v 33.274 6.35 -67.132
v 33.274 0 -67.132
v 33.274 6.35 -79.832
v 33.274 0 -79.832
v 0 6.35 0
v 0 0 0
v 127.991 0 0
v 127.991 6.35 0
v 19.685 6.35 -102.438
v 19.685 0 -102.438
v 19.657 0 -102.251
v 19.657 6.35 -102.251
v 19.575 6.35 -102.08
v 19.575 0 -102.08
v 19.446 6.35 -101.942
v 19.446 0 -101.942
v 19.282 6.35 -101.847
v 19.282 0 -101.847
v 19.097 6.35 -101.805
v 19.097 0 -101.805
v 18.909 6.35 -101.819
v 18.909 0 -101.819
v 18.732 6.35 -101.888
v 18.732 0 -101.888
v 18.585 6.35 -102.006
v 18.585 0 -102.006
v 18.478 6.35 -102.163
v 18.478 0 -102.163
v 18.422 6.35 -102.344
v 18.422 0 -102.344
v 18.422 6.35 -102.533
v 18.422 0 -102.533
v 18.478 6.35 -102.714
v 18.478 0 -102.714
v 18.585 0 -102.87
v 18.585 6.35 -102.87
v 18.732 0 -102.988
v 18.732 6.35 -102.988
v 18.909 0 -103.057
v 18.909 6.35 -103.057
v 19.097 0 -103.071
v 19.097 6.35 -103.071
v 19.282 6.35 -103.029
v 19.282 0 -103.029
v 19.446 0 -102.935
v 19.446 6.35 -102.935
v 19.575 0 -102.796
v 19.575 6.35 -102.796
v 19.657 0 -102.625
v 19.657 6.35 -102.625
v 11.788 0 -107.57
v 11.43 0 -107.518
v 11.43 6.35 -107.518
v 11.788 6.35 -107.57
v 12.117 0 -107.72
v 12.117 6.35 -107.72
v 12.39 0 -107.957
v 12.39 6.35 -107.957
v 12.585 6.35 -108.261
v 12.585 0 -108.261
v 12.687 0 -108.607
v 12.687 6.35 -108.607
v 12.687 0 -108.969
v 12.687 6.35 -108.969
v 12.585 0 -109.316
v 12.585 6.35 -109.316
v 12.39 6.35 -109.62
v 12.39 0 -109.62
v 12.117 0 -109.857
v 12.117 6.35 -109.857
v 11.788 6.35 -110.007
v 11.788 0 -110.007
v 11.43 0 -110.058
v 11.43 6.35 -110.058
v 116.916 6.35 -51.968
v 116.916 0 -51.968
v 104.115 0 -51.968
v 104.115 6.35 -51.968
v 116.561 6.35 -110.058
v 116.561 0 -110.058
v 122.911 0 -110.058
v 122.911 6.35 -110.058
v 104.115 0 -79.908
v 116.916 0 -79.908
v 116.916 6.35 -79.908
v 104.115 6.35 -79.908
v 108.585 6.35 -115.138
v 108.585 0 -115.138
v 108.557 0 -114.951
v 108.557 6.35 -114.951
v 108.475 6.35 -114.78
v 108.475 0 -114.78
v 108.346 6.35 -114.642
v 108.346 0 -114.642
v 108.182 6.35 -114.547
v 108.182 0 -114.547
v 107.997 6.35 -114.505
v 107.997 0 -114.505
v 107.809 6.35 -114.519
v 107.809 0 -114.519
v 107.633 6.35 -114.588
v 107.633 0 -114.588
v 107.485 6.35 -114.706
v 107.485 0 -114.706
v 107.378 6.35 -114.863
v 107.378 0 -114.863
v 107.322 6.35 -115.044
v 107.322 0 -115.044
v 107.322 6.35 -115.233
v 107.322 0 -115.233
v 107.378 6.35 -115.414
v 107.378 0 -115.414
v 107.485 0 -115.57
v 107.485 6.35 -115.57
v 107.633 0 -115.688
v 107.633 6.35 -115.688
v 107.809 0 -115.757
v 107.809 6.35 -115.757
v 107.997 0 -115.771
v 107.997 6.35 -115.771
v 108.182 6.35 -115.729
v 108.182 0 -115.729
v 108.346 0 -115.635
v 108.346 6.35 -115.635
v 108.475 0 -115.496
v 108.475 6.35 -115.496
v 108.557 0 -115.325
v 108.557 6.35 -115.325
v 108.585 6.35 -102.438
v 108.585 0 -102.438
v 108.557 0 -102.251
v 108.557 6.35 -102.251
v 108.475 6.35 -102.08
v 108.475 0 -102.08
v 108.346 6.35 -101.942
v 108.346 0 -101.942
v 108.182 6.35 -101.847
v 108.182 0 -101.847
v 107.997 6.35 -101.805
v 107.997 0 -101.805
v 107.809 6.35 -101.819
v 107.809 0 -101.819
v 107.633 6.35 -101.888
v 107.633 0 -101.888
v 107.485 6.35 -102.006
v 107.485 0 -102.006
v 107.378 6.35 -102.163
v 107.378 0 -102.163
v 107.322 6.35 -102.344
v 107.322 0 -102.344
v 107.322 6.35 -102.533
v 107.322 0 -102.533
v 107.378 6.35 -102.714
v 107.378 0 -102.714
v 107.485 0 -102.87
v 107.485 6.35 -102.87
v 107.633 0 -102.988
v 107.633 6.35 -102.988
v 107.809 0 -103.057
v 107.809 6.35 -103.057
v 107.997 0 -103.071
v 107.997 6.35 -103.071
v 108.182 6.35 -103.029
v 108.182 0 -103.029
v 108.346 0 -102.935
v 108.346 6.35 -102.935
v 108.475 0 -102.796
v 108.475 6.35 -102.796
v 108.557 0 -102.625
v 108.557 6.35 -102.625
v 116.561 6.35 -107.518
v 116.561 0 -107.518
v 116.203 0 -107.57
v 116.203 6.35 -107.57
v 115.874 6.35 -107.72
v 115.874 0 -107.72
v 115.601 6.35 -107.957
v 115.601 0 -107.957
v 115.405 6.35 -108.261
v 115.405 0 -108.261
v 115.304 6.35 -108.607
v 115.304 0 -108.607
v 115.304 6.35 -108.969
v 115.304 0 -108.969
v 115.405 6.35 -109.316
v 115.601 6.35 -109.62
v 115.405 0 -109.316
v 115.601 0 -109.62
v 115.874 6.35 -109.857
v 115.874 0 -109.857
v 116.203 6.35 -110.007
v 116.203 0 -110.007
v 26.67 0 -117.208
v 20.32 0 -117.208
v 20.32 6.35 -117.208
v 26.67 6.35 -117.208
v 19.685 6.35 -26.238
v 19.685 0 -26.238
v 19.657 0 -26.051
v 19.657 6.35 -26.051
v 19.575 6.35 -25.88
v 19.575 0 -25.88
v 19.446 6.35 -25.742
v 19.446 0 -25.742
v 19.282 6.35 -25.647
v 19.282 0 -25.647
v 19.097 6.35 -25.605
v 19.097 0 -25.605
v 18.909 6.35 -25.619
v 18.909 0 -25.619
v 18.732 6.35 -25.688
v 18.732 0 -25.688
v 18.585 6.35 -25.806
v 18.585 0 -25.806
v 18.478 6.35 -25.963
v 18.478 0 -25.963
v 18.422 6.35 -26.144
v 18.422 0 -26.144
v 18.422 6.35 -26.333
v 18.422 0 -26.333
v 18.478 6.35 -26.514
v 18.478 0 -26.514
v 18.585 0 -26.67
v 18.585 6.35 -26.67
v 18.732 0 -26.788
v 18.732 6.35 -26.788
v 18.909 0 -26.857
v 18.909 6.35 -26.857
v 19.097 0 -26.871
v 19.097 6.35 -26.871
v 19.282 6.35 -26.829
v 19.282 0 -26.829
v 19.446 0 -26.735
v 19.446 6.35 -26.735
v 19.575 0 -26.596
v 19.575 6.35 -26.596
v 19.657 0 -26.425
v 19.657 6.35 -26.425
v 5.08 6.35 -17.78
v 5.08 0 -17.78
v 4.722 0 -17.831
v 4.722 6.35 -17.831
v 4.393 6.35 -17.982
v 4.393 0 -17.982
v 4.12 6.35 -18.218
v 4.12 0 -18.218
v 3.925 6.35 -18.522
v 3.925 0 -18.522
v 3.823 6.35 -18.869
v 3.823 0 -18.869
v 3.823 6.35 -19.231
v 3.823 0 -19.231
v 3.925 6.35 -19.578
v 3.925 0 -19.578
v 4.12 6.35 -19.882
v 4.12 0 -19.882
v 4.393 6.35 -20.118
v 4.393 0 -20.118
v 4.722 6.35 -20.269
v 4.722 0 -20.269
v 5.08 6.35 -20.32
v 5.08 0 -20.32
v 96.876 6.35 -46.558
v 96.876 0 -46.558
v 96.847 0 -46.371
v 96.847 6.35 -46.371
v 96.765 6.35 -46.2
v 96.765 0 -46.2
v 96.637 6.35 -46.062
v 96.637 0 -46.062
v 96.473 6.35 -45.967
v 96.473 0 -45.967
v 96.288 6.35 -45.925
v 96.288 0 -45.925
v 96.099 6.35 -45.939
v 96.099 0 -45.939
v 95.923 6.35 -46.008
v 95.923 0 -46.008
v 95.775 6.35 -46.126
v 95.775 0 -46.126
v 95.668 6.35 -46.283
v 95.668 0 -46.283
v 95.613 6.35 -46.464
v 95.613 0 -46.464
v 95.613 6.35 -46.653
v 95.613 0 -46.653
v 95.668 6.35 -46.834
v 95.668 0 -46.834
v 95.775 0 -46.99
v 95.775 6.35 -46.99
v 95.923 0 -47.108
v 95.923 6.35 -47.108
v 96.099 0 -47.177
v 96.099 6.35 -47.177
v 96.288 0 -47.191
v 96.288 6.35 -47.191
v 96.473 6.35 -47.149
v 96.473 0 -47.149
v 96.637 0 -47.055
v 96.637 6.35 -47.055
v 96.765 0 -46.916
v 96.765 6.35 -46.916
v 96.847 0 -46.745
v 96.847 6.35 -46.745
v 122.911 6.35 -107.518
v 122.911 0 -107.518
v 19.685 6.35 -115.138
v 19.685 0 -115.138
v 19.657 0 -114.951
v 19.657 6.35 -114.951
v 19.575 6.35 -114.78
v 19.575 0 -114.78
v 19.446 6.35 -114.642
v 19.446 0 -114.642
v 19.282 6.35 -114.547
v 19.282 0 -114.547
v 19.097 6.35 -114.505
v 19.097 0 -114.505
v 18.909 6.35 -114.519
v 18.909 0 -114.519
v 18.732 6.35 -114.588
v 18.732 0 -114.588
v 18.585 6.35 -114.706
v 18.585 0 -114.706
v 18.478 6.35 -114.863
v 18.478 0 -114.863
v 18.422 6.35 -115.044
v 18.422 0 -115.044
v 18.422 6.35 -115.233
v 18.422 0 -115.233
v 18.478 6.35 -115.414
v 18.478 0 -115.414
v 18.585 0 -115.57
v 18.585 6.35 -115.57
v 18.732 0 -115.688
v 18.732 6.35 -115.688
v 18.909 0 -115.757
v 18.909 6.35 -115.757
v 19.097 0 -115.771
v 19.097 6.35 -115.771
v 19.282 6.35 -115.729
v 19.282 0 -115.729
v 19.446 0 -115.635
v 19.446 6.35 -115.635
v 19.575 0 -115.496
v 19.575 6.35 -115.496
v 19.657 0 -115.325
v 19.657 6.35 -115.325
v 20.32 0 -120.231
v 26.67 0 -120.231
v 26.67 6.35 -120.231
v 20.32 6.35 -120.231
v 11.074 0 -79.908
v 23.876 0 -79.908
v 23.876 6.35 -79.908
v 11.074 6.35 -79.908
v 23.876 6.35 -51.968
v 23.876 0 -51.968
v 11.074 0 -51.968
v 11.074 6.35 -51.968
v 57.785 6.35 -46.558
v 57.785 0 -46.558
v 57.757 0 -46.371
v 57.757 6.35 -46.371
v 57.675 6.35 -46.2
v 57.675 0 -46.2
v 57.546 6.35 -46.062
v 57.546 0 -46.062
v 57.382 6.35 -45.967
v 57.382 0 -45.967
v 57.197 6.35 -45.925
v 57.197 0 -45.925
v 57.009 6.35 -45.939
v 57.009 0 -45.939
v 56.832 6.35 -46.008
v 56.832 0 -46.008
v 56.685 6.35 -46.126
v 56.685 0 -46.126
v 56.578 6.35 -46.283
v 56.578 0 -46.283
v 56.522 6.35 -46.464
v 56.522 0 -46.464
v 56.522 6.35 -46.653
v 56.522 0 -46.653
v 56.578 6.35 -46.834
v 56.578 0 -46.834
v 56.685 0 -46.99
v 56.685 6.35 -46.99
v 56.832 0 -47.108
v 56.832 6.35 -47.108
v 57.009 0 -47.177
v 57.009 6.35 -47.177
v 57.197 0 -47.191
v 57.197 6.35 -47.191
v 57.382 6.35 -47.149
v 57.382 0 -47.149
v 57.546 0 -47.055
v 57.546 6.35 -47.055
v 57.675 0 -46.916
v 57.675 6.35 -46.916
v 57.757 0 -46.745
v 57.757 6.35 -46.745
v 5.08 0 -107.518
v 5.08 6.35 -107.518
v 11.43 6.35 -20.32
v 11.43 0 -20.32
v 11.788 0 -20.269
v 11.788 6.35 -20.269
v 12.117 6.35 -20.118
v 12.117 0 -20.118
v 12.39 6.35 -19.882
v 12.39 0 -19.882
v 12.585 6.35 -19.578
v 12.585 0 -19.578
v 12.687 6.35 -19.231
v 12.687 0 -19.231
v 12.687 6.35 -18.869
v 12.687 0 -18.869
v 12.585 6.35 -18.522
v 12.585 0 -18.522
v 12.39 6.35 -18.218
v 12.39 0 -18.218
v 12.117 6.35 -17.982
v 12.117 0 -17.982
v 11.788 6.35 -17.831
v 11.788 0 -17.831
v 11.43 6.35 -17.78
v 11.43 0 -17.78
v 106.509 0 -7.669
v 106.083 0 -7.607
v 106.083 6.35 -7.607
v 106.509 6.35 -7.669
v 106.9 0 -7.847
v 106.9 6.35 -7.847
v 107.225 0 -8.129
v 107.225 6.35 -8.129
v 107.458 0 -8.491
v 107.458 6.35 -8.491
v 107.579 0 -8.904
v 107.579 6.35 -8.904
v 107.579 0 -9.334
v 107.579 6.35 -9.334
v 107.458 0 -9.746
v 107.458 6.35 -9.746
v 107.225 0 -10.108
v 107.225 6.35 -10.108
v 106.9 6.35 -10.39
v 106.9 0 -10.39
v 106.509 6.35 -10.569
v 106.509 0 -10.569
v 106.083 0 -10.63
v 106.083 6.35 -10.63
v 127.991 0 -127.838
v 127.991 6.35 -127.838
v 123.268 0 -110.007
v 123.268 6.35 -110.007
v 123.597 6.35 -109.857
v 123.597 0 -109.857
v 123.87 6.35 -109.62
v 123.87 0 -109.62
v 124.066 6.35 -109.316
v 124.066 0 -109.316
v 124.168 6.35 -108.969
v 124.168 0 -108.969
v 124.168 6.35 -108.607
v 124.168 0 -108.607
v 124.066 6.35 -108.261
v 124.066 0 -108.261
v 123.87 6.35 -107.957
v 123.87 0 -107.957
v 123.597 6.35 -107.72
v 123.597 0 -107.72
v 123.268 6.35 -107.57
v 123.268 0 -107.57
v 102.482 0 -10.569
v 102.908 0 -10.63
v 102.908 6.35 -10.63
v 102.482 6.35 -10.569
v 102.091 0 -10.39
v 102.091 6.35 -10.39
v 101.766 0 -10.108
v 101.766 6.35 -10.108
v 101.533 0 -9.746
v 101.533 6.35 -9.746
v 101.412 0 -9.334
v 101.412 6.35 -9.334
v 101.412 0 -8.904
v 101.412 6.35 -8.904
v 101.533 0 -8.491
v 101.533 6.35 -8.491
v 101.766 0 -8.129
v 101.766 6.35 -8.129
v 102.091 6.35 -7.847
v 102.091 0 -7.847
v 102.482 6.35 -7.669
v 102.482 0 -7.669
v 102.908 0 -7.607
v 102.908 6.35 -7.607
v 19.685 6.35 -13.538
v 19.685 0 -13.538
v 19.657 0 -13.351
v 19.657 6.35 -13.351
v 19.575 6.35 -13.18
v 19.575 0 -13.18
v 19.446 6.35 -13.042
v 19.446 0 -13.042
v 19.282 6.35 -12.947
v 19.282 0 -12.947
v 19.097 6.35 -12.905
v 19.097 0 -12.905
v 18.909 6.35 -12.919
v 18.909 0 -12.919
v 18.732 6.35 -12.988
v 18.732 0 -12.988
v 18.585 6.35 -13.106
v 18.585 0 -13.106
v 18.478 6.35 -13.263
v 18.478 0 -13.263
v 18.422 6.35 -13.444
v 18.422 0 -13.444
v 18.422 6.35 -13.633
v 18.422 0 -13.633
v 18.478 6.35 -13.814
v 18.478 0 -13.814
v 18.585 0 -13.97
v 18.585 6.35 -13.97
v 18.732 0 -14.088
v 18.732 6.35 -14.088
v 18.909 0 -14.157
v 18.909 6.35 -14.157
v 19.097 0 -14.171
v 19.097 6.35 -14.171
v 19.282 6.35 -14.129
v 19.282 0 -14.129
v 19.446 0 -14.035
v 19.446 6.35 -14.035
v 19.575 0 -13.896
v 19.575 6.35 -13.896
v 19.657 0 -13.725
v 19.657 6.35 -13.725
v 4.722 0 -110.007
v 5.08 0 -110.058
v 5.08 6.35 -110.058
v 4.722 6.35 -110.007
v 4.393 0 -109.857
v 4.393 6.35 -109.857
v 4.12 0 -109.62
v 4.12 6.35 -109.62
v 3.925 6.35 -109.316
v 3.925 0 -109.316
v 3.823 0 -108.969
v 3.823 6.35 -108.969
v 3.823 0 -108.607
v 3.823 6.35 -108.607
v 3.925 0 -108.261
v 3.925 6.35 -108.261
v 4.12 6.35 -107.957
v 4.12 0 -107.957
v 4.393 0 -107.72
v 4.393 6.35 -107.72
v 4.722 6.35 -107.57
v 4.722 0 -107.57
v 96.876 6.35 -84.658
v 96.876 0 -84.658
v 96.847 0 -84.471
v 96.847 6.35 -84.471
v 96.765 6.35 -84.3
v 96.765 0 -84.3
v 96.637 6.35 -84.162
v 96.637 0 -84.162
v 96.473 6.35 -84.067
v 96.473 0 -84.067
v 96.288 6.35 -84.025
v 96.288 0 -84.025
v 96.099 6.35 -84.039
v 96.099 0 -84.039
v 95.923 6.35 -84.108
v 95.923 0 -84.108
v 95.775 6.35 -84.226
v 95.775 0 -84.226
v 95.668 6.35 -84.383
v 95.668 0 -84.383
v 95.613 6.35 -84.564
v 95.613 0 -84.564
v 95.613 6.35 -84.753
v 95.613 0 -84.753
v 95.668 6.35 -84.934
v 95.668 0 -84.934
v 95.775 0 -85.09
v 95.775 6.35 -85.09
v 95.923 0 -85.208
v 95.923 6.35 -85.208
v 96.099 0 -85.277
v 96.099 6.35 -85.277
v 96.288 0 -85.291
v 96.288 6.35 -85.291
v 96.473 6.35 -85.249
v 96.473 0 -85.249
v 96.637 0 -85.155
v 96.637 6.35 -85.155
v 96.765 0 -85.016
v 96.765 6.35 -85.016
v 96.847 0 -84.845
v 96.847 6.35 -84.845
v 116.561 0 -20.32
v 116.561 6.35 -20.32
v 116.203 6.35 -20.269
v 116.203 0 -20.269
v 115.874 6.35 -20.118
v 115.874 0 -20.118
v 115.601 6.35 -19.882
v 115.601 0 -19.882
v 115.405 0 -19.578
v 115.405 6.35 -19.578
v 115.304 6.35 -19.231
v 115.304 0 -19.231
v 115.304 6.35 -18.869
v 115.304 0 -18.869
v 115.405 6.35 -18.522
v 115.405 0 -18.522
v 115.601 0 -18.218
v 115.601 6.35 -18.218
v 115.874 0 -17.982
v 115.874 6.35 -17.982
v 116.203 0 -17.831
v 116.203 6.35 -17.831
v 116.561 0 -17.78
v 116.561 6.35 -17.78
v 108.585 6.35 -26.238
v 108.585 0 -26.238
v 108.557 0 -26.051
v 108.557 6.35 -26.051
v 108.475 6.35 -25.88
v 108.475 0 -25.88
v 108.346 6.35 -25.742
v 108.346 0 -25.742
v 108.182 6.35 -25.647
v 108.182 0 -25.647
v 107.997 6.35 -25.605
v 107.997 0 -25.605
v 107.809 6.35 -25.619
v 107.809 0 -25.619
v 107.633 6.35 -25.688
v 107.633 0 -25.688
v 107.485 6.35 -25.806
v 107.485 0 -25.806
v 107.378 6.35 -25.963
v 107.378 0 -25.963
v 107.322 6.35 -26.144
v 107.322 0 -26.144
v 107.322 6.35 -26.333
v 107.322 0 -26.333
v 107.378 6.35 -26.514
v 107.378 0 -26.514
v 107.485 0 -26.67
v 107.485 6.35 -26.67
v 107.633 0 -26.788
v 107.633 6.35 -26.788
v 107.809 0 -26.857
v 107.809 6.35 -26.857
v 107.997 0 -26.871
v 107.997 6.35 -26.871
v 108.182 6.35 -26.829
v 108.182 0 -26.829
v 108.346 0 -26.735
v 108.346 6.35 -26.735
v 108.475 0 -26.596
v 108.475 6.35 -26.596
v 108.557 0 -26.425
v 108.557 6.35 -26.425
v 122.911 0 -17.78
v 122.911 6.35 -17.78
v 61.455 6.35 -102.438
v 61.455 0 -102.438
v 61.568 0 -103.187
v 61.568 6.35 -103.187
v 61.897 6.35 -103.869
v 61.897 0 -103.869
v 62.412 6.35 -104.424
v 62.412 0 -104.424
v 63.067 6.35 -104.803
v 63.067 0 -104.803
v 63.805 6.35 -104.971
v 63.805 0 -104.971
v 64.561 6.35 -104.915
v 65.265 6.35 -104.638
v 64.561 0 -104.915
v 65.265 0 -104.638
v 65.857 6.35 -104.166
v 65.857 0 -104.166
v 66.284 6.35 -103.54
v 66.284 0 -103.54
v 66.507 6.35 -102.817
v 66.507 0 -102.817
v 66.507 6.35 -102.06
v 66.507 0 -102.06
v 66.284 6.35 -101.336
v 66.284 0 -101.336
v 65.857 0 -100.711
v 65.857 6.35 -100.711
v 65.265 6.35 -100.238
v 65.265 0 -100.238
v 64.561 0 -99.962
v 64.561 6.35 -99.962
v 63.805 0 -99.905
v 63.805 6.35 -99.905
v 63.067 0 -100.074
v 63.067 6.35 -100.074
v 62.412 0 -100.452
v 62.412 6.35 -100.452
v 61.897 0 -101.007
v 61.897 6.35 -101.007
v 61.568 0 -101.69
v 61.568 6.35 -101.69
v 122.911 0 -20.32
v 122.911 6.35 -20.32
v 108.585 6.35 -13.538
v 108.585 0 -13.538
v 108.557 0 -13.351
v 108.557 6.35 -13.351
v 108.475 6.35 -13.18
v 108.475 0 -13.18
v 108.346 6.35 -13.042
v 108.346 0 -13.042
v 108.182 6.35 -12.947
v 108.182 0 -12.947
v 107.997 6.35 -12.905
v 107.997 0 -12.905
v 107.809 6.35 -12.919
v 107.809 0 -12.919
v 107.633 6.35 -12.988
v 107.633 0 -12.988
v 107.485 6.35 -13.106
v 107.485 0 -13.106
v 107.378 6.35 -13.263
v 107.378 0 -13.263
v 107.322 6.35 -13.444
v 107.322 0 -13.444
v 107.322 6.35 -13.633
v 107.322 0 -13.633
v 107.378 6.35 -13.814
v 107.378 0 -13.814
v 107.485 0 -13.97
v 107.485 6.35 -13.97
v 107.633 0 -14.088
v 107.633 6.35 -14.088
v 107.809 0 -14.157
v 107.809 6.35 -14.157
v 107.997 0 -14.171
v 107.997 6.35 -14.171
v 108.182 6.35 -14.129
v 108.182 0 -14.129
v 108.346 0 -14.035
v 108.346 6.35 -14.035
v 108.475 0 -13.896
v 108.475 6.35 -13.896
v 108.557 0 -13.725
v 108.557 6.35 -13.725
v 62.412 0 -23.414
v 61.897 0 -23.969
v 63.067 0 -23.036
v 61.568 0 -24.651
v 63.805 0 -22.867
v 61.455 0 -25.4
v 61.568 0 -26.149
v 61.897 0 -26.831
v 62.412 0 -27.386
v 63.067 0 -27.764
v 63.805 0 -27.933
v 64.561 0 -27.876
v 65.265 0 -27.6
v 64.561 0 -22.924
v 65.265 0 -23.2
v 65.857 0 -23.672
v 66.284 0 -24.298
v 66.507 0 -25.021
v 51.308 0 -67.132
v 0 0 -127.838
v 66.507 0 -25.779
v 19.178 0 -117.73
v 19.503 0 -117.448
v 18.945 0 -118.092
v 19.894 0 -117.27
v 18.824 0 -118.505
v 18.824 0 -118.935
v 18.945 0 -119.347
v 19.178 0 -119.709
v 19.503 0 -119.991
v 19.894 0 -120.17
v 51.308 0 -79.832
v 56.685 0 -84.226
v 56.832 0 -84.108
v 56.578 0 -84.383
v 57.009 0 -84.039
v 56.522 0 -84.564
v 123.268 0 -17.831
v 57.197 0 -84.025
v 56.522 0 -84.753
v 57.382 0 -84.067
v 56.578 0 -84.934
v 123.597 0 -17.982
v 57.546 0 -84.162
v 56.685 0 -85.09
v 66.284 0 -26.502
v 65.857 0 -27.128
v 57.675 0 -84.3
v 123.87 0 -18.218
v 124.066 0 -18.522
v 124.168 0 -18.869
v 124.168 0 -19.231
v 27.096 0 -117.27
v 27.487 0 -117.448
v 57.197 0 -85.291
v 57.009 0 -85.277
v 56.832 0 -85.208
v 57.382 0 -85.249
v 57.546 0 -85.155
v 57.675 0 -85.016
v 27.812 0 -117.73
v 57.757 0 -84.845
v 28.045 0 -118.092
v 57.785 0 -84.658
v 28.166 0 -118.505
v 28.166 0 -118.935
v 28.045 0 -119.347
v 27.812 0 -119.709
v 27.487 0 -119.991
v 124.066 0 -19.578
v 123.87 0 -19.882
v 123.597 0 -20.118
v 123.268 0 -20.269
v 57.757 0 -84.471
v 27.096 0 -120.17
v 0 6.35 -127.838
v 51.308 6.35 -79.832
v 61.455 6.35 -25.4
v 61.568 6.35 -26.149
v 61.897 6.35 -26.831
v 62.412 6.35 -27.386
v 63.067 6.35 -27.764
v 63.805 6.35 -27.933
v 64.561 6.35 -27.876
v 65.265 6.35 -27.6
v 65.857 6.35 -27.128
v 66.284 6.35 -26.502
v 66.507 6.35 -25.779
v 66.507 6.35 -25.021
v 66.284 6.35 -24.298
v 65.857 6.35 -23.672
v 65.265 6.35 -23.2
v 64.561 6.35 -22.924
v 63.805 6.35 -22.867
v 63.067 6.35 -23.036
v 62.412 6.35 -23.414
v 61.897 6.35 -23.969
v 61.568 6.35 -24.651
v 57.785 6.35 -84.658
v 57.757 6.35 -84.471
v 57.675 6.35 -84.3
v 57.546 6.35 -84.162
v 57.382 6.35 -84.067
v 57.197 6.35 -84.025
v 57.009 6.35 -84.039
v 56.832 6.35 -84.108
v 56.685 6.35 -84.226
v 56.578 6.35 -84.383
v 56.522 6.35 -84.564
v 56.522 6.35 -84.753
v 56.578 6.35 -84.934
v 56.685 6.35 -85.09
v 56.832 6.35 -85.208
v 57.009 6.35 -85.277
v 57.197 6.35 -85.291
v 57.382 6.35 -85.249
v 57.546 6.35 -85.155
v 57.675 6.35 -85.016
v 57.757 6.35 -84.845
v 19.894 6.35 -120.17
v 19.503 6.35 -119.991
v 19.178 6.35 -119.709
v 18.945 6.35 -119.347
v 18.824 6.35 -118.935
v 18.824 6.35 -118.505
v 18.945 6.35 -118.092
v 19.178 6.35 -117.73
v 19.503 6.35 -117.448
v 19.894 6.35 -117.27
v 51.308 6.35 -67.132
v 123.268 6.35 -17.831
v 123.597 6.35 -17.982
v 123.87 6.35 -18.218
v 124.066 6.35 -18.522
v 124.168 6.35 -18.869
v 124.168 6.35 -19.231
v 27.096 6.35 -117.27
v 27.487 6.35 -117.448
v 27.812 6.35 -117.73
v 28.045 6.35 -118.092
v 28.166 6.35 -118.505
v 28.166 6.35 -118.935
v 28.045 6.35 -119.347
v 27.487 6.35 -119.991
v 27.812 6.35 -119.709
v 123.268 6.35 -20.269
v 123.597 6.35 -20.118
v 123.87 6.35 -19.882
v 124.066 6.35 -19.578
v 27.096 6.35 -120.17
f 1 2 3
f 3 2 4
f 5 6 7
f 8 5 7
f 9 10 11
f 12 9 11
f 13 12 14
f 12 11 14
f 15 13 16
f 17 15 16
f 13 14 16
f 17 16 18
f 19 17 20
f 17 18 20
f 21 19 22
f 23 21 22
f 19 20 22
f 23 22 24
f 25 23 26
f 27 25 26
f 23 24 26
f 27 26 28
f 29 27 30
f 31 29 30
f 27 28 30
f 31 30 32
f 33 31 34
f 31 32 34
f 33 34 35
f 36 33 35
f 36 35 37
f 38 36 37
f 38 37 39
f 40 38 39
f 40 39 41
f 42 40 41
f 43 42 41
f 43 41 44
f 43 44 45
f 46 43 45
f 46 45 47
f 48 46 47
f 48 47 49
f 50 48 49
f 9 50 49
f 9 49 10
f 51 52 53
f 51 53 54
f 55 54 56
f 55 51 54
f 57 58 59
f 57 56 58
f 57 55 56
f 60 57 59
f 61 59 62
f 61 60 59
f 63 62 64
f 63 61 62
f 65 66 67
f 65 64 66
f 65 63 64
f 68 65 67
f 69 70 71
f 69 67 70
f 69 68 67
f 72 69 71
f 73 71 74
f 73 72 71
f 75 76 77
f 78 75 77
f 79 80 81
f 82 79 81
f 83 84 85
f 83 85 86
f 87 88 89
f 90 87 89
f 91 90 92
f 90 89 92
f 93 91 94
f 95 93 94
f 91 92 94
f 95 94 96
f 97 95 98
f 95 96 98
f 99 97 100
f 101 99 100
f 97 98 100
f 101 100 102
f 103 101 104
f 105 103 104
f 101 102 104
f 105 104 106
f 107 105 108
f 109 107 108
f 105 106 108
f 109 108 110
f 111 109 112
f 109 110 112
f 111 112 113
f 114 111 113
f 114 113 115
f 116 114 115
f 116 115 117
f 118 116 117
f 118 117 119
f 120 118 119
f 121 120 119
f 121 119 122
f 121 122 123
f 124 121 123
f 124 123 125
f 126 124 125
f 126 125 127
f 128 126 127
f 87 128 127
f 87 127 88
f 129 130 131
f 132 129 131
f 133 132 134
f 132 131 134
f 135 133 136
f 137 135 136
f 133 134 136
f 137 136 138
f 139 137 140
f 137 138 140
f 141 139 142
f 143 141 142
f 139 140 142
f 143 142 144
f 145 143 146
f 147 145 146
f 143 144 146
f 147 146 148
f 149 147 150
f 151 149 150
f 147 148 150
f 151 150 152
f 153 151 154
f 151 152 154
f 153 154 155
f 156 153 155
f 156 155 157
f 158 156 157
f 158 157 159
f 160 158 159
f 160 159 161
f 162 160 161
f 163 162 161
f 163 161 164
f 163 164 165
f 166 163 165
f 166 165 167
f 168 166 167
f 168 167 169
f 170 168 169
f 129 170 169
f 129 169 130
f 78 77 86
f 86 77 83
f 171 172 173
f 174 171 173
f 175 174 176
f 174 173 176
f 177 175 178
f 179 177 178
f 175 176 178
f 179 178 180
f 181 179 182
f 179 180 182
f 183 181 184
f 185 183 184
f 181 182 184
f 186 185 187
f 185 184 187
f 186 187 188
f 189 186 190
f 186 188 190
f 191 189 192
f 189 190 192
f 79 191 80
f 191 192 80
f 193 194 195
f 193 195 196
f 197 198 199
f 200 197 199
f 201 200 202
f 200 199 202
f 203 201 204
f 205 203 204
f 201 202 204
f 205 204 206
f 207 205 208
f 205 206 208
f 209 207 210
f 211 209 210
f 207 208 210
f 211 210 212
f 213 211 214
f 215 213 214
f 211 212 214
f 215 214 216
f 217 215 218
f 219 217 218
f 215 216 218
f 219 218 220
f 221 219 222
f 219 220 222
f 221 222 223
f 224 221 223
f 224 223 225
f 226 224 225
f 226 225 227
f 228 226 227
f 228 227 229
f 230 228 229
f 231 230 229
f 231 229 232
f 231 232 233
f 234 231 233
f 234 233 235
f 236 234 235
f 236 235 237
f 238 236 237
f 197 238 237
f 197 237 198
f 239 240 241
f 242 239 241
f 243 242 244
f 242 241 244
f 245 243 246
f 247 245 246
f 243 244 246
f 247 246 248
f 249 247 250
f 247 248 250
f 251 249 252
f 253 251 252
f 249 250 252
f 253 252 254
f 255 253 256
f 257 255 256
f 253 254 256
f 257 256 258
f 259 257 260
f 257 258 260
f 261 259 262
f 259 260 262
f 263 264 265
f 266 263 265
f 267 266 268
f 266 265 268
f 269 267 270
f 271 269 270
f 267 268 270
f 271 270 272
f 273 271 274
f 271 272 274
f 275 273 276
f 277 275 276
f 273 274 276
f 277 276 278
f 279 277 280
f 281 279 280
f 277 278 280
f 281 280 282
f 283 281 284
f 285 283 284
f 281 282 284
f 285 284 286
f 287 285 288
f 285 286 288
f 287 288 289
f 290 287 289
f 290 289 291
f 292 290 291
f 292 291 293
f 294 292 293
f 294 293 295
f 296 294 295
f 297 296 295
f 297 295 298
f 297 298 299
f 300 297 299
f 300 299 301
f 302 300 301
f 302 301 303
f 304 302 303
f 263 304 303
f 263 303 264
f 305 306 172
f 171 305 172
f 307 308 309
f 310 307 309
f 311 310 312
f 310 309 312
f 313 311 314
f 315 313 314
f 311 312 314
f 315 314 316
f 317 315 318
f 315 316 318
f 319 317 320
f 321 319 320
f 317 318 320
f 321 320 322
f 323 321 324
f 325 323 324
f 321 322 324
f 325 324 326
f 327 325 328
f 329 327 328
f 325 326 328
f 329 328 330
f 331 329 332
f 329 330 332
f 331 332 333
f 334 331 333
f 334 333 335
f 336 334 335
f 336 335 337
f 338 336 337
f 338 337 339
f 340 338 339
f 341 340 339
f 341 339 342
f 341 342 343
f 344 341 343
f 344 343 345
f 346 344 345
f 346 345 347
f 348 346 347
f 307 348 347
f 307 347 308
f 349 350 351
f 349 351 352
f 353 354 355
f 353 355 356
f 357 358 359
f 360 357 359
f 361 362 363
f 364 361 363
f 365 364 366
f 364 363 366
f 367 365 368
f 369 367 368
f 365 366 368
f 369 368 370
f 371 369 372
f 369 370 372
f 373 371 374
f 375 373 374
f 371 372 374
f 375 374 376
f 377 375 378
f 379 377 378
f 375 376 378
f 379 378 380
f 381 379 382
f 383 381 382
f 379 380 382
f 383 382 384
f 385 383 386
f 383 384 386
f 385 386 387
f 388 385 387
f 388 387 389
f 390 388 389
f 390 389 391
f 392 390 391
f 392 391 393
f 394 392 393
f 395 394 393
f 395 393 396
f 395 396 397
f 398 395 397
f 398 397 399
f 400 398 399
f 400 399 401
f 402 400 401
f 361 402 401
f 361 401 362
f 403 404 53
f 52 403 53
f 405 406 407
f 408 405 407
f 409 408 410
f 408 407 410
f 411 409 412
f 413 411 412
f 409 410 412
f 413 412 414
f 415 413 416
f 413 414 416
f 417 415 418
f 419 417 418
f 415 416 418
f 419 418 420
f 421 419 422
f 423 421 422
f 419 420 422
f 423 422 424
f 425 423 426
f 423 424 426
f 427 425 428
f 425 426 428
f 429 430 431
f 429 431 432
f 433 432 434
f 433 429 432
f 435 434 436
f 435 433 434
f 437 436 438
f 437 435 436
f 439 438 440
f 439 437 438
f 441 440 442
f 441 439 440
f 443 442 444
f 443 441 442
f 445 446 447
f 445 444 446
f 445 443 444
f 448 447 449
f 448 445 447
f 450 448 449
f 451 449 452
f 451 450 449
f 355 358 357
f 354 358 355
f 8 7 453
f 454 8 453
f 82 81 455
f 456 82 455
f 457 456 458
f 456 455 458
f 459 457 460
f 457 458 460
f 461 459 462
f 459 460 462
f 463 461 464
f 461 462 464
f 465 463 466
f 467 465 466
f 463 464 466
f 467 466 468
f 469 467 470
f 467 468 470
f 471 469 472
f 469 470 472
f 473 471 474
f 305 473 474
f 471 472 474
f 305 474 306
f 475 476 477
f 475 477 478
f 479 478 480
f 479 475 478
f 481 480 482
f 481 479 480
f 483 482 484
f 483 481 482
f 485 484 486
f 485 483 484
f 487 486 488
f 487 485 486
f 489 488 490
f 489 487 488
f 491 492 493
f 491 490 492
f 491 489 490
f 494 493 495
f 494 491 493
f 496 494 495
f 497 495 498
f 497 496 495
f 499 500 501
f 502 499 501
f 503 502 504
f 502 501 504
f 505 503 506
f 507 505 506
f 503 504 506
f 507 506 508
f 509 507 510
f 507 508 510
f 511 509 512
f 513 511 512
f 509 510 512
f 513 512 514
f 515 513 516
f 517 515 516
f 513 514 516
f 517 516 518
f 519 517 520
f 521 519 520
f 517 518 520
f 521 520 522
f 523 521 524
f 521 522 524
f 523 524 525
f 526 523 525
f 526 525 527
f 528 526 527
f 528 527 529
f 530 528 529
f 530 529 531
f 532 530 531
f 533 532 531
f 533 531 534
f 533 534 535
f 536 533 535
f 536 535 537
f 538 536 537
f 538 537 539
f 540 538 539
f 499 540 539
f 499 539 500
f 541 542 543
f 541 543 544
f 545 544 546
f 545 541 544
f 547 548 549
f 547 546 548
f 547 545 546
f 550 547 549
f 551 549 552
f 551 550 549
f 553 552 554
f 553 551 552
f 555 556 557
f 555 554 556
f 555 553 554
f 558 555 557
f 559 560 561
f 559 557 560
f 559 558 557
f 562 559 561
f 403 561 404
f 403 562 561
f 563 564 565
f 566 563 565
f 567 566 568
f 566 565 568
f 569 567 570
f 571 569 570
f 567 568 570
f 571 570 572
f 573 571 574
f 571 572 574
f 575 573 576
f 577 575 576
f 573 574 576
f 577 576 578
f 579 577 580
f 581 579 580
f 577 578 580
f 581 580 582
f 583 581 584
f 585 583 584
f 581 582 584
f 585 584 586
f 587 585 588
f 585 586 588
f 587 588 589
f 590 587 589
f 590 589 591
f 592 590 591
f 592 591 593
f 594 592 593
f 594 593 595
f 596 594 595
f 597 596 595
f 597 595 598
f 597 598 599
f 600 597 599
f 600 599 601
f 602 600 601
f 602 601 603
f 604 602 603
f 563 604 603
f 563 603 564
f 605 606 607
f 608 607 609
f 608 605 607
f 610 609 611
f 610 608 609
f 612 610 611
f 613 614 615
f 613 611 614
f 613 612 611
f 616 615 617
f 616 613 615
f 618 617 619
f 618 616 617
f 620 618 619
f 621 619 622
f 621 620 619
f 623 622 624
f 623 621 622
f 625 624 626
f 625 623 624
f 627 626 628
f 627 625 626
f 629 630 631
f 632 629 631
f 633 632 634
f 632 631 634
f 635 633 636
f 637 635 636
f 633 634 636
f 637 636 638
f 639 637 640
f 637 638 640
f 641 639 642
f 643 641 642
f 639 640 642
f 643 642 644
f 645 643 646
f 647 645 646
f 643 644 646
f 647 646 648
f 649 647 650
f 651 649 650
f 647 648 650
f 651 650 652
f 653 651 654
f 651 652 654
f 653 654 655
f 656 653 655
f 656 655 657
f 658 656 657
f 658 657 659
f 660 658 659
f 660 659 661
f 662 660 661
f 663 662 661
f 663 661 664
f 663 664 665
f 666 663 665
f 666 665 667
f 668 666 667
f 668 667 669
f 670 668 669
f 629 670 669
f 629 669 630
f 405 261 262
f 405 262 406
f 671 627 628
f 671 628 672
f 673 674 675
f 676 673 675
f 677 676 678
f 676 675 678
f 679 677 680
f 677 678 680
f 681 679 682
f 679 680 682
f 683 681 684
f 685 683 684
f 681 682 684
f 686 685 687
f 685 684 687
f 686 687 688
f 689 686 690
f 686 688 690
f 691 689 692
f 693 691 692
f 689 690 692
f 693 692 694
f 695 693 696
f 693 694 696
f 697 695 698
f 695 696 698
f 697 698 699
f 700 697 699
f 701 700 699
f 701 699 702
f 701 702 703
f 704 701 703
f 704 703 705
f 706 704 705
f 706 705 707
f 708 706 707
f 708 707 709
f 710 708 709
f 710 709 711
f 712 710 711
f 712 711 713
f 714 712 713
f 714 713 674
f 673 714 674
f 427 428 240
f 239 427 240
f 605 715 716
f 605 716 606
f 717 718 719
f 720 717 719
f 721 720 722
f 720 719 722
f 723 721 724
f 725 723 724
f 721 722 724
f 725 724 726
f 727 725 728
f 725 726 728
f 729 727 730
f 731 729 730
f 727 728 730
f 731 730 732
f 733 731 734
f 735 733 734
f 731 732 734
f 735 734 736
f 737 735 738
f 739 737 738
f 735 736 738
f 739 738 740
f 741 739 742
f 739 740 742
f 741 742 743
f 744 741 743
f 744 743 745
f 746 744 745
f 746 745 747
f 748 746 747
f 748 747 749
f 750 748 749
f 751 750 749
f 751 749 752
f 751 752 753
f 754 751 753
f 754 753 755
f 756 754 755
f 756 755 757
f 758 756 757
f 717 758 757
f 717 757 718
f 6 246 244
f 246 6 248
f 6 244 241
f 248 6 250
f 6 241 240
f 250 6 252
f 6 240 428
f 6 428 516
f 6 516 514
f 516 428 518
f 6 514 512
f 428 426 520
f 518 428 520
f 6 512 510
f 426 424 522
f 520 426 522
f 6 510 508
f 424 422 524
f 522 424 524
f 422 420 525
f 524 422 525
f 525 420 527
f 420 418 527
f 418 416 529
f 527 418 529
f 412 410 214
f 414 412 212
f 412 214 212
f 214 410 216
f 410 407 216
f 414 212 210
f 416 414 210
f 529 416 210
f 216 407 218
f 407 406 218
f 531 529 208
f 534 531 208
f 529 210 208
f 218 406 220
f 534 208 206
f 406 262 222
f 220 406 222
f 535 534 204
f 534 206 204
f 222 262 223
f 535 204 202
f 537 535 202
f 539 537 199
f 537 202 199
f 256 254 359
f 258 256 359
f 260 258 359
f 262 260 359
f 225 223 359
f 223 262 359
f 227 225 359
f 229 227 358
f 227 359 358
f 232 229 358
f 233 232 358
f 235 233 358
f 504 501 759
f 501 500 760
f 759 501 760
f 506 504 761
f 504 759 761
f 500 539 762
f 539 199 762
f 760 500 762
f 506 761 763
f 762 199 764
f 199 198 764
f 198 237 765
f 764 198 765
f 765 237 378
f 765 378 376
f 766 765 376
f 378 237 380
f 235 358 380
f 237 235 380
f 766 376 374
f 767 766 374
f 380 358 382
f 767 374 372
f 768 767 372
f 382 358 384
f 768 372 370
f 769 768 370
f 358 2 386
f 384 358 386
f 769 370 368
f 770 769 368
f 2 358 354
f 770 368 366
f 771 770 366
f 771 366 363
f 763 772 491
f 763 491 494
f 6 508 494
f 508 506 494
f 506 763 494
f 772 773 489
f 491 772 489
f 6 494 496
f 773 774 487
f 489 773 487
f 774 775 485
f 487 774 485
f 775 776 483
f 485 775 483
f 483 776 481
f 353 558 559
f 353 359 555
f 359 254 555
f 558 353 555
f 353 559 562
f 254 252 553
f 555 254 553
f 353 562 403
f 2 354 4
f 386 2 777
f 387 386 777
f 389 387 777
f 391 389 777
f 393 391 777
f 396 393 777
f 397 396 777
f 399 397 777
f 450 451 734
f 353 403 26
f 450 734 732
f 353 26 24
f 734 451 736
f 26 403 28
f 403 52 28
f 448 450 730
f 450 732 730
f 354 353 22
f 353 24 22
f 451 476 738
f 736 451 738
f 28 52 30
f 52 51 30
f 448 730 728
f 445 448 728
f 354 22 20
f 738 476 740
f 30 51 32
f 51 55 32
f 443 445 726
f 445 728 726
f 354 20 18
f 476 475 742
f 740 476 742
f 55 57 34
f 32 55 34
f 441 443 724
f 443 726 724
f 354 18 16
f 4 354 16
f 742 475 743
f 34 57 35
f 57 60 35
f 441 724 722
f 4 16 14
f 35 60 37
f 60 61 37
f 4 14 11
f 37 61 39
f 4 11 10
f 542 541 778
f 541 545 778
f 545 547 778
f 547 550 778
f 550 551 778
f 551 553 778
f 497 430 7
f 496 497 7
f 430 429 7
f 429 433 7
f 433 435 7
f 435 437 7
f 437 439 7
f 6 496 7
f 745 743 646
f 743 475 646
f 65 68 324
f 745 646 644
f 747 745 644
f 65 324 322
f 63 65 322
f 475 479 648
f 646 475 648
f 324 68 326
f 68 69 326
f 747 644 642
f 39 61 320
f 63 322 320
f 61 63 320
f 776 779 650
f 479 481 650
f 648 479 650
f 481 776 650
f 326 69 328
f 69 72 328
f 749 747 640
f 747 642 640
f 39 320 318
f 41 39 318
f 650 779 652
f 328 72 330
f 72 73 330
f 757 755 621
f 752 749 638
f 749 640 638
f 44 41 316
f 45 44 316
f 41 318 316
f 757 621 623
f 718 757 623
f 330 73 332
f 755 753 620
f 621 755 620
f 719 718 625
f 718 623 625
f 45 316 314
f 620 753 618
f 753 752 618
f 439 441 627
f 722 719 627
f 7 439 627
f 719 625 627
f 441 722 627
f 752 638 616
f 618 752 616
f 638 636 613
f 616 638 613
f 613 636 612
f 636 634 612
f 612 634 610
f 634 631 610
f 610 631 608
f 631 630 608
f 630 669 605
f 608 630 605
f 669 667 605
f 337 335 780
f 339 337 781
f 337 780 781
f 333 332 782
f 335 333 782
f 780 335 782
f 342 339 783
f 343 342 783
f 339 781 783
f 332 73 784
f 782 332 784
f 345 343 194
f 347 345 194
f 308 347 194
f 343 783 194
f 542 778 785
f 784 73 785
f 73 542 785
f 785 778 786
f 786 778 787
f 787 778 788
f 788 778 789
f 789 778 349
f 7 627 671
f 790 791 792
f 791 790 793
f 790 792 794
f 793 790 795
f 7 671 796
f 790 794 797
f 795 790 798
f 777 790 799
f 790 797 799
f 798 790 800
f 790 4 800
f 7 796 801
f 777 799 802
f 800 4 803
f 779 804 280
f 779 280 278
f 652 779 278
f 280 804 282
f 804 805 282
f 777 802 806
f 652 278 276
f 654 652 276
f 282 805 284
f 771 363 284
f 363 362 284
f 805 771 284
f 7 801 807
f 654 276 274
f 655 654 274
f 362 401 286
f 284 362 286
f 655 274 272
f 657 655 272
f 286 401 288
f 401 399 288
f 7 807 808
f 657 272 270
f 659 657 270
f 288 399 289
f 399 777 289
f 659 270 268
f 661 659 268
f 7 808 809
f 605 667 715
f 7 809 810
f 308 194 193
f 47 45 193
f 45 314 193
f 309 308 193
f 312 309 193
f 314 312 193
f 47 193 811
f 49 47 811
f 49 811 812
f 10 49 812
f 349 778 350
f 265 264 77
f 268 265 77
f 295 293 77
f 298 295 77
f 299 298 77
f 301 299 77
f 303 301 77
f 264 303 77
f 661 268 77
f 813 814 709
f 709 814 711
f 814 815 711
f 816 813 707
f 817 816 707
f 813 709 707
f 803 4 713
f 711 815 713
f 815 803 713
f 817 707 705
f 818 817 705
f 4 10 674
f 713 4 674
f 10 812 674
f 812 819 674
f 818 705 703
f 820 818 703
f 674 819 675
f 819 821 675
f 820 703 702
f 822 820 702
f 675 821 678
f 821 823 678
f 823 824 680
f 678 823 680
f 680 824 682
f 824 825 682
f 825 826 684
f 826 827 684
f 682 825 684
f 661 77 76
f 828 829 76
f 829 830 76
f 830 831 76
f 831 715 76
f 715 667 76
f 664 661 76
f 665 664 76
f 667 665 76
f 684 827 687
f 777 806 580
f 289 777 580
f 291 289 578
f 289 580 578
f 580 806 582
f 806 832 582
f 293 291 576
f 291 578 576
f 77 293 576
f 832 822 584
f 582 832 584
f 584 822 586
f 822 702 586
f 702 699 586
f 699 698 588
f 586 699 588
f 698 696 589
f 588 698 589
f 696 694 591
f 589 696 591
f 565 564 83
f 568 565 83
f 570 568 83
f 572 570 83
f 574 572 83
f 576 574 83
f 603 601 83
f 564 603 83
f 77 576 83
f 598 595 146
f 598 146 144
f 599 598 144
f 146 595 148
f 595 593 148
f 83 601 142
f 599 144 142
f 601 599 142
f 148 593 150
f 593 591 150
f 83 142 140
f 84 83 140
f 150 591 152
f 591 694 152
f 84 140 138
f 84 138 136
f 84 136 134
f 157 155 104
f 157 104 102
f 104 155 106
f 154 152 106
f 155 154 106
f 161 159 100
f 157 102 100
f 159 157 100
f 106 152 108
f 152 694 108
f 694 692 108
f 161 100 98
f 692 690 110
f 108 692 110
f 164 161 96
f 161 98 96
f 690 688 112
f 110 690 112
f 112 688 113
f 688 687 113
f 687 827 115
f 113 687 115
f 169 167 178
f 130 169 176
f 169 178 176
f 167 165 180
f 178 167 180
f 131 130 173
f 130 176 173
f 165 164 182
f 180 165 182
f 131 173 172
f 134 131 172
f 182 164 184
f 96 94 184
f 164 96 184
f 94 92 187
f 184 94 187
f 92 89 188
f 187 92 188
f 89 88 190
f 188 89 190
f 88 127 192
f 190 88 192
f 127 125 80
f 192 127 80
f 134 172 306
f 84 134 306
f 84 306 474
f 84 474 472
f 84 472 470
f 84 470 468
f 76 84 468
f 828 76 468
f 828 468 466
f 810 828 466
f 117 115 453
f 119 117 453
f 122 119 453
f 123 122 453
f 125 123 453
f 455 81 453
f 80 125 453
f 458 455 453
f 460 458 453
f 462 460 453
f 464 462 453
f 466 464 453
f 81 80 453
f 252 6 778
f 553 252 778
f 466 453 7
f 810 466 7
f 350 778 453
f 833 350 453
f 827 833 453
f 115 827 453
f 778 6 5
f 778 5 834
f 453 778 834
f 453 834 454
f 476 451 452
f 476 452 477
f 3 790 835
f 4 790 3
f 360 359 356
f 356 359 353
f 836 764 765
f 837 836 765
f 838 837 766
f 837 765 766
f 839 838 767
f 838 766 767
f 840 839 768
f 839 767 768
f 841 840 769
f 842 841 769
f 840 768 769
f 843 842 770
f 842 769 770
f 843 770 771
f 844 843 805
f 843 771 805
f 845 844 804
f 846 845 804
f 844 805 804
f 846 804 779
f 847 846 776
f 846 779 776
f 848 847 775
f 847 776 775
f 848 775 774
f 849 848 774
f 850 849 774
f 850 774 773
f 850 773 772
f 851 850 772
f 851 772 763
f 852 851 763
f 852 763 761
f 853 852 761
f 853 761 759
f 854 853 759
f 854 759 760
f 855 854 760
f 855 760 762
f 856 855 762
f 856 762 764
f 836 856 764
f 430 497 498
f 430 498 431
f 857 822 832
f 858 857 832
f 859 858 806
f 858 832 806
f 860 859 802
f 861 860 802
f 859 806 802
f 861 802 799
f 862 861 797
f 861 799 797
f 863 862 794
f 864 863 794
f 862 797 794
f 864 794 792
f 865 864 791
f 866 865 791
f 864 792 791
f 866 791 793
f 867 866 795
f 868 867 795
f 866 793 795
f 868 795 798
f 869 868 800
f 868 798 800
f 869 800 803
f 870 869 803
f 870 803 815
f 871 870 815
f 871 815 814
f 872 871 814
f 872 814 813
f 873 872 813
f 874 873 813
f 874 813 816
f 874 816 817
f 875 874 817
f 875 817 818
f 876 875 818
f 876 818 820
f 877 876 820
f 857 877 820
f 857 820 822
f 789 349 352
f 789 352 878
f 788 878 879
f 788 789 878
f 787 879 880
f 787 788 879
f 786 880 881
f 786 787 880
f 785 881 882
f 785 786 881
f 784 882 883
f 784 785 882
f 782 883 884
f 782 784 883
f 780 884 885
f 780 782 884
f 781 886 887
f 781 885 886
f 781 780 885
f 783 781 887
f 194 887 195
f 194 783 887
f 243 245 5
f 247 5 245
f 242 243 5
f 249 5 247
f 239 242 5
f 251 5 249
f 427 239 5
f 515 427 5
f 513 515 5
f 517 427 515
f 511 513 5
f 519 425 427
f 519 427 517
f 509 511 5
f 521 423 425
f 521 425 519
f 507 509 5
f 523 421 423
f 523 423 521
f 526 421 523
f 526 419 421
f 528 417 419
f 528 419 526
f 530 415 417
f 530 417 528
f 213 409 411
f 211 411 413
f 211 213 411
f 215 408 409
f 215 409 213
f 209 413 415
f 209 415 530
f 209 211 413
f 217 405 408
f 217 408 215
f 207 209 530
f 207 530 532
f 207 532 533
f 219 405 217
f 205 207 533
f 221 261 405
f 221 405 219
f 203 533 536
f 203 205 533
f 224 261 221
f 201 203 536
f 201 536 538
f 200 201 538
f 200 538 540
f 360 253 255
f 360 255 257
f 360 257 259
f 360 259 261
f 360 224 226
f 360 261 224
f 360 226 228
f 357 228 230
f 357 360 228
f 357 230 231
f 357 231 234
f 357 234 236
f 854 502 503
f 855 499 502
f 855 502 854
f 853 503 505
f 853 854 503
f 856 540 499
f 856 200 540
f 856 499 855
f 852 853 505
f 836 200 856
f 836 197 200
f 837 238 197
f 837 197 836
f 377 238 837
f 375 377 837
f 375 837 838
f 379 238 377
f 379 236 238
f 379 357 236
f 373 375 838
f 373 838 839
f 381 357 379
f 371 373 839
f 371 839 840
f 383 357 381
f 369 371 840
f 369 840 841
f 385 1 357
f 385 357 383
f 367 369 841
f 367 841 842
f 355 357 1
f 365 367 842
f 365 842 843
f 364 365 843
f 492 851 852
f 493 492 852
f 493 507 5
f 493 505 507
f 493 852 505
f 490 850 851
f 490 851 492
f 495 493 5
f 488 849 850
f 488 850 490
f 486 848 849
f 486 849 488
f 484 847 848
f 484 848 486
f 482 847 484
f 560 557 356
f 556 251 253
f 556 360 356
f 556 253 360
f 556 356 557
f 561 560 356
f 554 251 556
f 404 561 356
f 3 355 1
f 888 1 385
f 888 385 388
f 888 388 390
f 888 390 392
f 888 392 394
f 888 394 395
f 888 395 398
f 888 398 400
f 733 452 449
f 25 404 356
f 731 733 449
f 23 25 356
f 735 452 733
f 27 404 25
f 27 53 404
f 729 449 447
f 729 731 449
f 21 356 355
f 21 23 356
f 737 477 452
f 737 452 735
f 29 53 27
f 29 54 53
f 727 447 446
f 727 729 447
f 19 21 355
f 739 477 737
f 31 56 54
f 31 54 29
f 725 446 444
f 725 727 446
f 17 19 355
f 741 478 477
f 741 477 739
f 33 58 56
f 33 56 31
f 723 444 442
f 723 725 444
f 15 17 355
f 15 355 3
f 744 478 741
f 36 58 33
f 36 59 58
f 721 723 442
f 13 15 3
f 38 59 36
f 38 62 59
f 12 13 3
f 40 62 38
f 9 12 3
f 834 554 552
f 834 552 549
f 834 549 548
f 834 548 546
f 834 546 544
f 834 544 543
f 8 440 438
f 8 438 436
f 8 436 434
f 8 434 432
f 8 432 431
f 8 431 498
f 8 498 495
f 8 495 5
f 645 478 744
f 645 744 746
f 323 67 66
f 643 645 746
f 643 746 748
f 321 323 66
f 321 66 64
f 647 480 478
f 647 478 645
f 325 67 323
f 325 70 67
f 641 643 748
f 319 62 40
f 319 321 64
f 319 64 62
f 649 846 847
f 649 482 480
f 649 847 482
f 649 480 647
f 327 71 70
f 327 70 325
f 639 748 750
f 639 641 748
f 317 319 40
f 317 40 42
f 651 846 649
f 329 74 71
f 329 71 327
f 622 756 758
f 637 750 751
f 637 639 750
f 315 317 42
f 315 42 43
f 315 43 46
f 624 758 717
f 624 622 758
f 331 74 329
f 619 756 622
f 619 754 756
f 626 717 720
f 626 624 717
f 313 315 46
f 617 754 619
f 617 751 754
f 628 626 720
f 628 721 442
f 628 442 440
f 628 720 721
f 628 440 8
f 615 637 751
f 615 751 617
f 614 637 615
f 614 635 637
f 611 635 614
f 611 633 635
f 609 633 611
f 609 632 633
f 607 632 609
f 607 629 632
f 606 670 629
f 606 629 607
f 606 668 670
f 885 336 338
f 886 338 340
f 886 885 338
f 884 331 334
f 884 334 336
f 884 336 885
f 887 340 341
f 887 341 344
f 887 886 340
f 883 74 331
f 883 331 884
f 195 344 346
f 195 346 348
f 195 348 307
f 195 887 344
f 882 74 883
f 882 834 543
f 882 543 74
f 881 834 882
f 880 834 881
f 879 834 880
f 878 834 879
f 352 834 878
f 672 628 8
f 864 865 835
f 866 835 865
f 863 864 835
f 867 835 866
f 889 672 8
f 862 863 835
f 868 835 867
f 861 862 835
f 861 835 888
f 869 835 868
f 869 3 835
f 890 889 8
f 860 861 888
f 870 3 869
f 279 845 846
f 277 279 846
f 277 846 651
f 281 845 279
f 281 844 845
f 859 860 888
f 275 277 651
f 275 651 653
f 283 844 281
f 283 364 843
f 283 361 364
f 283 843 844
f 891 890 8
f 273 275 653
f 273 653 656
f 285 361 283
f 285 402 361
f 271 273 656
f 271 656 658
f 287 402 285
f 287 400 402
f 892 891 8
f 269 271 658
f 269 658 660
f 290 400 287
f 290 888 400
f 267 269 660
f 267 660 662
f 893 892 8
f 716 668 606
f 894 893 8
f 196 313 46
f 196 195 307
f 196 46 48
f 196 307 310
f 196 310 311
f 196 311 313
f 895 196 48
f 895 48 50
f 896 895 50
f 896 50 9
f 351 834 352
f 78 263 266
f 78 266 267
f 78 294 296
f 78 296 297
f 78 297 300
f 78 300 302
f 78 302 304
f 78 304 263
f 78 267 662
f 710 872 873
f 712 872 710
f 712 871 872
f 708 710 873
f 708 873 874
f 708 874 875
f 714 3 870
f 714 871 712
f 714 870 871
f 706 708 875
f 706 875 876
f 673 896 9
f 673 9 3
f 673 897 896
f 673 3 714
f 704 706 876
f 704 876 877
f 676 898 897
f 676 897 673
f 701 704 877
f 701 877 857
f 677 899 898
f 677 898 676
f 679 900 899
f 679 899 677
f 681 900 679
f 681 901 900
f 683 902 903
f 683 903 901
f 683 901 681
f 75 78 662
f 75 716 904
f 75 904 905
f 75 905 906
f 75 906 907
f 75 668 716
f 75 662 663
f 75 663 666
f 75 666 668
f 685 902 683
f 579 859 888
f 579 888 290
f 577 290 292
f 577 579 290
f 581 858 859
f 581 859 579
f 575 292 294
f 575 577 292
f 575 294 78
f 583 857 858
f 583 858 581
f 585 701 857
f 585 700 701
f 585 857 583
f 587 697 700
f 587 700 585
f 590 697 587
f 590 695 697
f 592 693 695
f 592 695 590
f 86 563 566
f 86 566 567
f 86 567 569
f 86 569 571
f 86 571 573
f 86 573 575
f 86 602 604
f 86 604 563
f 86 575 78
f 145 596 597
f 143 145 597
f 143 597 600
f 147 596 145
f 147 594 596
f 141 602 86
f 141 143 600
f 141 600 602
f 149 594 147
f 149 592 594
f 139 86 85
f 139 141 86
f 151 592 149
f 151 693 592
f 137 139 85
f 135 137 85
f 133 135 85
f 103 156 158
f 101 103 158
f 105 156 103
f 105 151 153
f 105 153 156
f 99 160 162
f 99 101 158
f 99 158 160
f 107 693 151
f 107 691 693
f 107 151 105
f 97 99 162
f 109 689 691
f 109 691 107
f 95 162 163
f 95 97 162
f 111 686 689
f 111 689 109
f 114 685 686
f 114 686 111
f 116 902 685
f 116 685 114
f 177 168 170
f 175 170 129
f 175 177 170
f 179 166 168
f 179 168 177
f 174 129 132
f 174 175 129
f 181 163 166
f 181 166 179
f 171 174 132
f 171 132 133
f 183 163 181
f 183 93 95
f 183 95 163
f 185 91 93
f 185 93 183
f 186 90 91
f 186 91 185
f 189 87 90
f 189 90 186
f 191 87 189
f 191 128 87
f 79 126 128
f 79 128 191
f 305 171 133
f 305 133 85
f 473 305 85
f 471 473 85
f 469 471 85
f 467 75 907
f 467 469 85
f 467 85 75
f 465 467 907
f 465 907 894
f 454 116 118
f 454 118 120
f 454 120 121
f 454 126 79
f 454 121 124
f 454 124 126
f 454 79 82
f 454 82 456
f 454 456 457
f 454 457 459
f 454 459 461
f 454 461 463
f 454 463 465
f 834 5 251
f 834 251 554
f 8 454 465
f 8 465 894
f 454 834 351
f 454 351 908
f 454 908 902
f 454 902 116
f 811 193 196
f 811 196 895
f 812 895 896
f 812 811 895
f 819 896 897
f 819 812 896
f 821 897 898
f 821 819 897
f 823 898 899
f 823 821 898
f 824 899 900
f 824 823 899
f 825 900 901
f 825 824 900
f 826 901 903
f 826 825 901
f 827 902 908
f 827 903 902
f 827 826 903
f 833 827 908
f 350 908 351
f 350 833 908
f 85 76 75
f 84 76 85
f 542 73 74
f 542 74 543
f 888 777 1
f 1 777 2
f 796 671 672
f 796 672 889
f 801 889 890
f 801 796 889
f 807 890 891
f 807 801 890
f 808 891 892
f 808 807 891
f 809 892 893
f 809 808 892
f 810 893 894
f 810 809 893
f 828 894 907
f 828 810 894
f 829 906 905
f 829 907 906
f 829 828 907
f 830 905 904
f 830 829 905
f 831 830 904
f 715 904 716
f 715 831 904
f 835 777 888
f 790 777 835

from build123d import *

# Parameters (mm, degrees)
SKETCH1_W           = 127.9906
SKETCH1_H           = 127.8382
BOSS_EXTRUDE1_DEPTH = 6.35
SKETCH3_R           = 2.54
SKETCH3_W           = 12.8016
SKETCH3_H           = 27.94
SKETCH3_W_2         = 18.034
SKETCH3_H_2         = 12.7
CUT_EXTRUDE1_DEPTH  = 7.35
SKETCH8_R           = 0.635
CUT_EXTRUDE2_DEPTH  = 20.05


with BuildPart() as part:
    # Sketch1 → Boss-Extrude1 (new body)
    with BuildSketch(Plane(origin=(0, 0, 0), x_dir=(1, 0, 0), z_dir=(0, 1, 0))):
        with Locations((63.9953, 63.9191)):
            Rectangle(SKETCH1_W, SKETCH1_H)
    extrude(amount=BOSS_EXTRUDE1_DEPTH)

    # Sketch3 → Cut-Extrude1 (cut, through all)
    with BuildSketch(Plane(origin=(0, 0, 0), x_dir=(-1, 0, 0), z_dir=(0, -1, 0))):
        with Locations((-63.9953, 25.4)):
            Circle(SKETCH3_R)
        with Locations((-63.9953, 102.4382)):
            Circle(SKETCH3_R)
        with BuildLine():
            Line((-5.08, 107.5182), (-11.43, 107.5182))
            ThreePointArc((-11.43, 107.5182), (-12.7, 108.7882), (-11.43, 110.0582))
            Line((-11.43, 110.0582), (-5.08, 110.0582))
            ThreePointArc((-5.08, 110.0582), (-3.81, 108.7882), (-5.08, 107.5182))
        make_face()
        with BuildLine():
            Line((-122.9106, 107.5182), (-116.5606, 107.5182))
            ThreePointArc((-116.5606, 107.5182), (-115.2906, 108.7882), (-116.5606, 110.0582))
            Line((-116.5606, 110.0582), (-122.9106, 110.0582))
            ThreePointArc((-122.9106, 110.0582), (-124.1806, 108.7882), (-122.9106, 107.5182))
        make_face()
        with BuildLine():
            Line((-122.9106, 20.32), (-116.5606, 20.32))
            ThreePointArc((-116.5606, 20.32), (-115.2906, 19.05), (-116.5606, 17.78))
            Line((-116.5606, 17.78), (-122.9106, 17.78))
            ThreePointArc((-122.9106, 17.78), (-124.1806, 19.05), (-122.9106, 20.32))
        make_face()
        with BuildLine():
            Line((-5.08, 20.32), (-11.43, 20.32))
            ThreePointArc((-11.43, 20.32), (-12.7, 19.05), (-11.43, 17.78))
            Line((-11.43, 17.78), (-5.08, 17.78))
            ThreePointArc((-5.08, 17.78), (-3.81, 19.05), (-5.08, 20.32))
        make_face()
        with BuildLine():
            Line((-20.32, 117.2083), (-26.67, 117.2083))
            ThreePointArc((-26.67, 117.2083), (-28.1813, 118.7196), (-26.67, 120.2309))
            Line((-26.67, 120.2309), (-20.32, 120.2309))
            ThreePointArc((-20.32, 120.2309), (-18.8087, 118.7196), (-20.32, 117.2083))
        make_face()
        with BuildLine():
            Line((-102.9081, 7.6073), (-106.0831, 7.6073))
            ThreePointArc((-106.0831, 7.6073), (-107.5944, 9.1186), (-106.0831, 10.6299))
            Line((-106.0831, 10.6299), (-102.9081, 10.6299))
            ThreePointArc((-102.9081, 10.6299), (-101.3968, 9.1186), (-102.9081, 7.6073))
        make_face()
        with Locations((-110.5154, 65.9384)):
            Rectangle(SKETCH3_W, SKETCH3_H)
        with Locations((-17.4752, 65.9384)):
            Rectangle(SKETCH3_W, SKETCH3_H)
        with Locations((-42.291, 73.4822)):
            Rectangle(SKETCH3_W_2, SKETCH3_H_2)
    extrude(amount=-CUT_EXTRUDE1_DEPTH, mode=Mode.SUBTRACT)

    # Sketch8 → Cut-Extrude2 (cut, through all)
    with BuildSketch(Plane.XZ.offset(12.7)):
        with Locations((19.05, -26.2382)):
            Circle(SKETCH8_R)
        with Locations((19.05, -13.5382)):
            Circle(SKETCH8_R)
        with Locations((19.05, -102.4382)):
            Circle(SKETCH8_R)
        with Locations((19.05, -115.1382)):
            Circle(SKETCH8_R)
        with Locations((57.15, -84.6582)):
            Circle(SKETCH8_R)
        with Locations((57.15, -46.5582)):
            Circle(SKETCH8_R)
        with Locations((96.2406, -46.5582)):
            Circle(SKETCH8_R)
        with Locations((96.2406, -84.6582)):
            Circle(SKETCH8_R)
        with Locations((107.95, -115.1382)):
            Circle(SKETCH8_R)
        with Locations((107.95, -102.4382)):
            Circle(SKETCH8_R)
        with Locations((107.95, -26.2382)):
            Circle(SKETCH8_R)
        with Locations((107.95, -13.5382)):
            Circle(SKETCH8_R)
    extrude(amount=-CUT_EXTRUDE2_DEPTH, mode=Mode.SUBTRACT)


solid = part.part
